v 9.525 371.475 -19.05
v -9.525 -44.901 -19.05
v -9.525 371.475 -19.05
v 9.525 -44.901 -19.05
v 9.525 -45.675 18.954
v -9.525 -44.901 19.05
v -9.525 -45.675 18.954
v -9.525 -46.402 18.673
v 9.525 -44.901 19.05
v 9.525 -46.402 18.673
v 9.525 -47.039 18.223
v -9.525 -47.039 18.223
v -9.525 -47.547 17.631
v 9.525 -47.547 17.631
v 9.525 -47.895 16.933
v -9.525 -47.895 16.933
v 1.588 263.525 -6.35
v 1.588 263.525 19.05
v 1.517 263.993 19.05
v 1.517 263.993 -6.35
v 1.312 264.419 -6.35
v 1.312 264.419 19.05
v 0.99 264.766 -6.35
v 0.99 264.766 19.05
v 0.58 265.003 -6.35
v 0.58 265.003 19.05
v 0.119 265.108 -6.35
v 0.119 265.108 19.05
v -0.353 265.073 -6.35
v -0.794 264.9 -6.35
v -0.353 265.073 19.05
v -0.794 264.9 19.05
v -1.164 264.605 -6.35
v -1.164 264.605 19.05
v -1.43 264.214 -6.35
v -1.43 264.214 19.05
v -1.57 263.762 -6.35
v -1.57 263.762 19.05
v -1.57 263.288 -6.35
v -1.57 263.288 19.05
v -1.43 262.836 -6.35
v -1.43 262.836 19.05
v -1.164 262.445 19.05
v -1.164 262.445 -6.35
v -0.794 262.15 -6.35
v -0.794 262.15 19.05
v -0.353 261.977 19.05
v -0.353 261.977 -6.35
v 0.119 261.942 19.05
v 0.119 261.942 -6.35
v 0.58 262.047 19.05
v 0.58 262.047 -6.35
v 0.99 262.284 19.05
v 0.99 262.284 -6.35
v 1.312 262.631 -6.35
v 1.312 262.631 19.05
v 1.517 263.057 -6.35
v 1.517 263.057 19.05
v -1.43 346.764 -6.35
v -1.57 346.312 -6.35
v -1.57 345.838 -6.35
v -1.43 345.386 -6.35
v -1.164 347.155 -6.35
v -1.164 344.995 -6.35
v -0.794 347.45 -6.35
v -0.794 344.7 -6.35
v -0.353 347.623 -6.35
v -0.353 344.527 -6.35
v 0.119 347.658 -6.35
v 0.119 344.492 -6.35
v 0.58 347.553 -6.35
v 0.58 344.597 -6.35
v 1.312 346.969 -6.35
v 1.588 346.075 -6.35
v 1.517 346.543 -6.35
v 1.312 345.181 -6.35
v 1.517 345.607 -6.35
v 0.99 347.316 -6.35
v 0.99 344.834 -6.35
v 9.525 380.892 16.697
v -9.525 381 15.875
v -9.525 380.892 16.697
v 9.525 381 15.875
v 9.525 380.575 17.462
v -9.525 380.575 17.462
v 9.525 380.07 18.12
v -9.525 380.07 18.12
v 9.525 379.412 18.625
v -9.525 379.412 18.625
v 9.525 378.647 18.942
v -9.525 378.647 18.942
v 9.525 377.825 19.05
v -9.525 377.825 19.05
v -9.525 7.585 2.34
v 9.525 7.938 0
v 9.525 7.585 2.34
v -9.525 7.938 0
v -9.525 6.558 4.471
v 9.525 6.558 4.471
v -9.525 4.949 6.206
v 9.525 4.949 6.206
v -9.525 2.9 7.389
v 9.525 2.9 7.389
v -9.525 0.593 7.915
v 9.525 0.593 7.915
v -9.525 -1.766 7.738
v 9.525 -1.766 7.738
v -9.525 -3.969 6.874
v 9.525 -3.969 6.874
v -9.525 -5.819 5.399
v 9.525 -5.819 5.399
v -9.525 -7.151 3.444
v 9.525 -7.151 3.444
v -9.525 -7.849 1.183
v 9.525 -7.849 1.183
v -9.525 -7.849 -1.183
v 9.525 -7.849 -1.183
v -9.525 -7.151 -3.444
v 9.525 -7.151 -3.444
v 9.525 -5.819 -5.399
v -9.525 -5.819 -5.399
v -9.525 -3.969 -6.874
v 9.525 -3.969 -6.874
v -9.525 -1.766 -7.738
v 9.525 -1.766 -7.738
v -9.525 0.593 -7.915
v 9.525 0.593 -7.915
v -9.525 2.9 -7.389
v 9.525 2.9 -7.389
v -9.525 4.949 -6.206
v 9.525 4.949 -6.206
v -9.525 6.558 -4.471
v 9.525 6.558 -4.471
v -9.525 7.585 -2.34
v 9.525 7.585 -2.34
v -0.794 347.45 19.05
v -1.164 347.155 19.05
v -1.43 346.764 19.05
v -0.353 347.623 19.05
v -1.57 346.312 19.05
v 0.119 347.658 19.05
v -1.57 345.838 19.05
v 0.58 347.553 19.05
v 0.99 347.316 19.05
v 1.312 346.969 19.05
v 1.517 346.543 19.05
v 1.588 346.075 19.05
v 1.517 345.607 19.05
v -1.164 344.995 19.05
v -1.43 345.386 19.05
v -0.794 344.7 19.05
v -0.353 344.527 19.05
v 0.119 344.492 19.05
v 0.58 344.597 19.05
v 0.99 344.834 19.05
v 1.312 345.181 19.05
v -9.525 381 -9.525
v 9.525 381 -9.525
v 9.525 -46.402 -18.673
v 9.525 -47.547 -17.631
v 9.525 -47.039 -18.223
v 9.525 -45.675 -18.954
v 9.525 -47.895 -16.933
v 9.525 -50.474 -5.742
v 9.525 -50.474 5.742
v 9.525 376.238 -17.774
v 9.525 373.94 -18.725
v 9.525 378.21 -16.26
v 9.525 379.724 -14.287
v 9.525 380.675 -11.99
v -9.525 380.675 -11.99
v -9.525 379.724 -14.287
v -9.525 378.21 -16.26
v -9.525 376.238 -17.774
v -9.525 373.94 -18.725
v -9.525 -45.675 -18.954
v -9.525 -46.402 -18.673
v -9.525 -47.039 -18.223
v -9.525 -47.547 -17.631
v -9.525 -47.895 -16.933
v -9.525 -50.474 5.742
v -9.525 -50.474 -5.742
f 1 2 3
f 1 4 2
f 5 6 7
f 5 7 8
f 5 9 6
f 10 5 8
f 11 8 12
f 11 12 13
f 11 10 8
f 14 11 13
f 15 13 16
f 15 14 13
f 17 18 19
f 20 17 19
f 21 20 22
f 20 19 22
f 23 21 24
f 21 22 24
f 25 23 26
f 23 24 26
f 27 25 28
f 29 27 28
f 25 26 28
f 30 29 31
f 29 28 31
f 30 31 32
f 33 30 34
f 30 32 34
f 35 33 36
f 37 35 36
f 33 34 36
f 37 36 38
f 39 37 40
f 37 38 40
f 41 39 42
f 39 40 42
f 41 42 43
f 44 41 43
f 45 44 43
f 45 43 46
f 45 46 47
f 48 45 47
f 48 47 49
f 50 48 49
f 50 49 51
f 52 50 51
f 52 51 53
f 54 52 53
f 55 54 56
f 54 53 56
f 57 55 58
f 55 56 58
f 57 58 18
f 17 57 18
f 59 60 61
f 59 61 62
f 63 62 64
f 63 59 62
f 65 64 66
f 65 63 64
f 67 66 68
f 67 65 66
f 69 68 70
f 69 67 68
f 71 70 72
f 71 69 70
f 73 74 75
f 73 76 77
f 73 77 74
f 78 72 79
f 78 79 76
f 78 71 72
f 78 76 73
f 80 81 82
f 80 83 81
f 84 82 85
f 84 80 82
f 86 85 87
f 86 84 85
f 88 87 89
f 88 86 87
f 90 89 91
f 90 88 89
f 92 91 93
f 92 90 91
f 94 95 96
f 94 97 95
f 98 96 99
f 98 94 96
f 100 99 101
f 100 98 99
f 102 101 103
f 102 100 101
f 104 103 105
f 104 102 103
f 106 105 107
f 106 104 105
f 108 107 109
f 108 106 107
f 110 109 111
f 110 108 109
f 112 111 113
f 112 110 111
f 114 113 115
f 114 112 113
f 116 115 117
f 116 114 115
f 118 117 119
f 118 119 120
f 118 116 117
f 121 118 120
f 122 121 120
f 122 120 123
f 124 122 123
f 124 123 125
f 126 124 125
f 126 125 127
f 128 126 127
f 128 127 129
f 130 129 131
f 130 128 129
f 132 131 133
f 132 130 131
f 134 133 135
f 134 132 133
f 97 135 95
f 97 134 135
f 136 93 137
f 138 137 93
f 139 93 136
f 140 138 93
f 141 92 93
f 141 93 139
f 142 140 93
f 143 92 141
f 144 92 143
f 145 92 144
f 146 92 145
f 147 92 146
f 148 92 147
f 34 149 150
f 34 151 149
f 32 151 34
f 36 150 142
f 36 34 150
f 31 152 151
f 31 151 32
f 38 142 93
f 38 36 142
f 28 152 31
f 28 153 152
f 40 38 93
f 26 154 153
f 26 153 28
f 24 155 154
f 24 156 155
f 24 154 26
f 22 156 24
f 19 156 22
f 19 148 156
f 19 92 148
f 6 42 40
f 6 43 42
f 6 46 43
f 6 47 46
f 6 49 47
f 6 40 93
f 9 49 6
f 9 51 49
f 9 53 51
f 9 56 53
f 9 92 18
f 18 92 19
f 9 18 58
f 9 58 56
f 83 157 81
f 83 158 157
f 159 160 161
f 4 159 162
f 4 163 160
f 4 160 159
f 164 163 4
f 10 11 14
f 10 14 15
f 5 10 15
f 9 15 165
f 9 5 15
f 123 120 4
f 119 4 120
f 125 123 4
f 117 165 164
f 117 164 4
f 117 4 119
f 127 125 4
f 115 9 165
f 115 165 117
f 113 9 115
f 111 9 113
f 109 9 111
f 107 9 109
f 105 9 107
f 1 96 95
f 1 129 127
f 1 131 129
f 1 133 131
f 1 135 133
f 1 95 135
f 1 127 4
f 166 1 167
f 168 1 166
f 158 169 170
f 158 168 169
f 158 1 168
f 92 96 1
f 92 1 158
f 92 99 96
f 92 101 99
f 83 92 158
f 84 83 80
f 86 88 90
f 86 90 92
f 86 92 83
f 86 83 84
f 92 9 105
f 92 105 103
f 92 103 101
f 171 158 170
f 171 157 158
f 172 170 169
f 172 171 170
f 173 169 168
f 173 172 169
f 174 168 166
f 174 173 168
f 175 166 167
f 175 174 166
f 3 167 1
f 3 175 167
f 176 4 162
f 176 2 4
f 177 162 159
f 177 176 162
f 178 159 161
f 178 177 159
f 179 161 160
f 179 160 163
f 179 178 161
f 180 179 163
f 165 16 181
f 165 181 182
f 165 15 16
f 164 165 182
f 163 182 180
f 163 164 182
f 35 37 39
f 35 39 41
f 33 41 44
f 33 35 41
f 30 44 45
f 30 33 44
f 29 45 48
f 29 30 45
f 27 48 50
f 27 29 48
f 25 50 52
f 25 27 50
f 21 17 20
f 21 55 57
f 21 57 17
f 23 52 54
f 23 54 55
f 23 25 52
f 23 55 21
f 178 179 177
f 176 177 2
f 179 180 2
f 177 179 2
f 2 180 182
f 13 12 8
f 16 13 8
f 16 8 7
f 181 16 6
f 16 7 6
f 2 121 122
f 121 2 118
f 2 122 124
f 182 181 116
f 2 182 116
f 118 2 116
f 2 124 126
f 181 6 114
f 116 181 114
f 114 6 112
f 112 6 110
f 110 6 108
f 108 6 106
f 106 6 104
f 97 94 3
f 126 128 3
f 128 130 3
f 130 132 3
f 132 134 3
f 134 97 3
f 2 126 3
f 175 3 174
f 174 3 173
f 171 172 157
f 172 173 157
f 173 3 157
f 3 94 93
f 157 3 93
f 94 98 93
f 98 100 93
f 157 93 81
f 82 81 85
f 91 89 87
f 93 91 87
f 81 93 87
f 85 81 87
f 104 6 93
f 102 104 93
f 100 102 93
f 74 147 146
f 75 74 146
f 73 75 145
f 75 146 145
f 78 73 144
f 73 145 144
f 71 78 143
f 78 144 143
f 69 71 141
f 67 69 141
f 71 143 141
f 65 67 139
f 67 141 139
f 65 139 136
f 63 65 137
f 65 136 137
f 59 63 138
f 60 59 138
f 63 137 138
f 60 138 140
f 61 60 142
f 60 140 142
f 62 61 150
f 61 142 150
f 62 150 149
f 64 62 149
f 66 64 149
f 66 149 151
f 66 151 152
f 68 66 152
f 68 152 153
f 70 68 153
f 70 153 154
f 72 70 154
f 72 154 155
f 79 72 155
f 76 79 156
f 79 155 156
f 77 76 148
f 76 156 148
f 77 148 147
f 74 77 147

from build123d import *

# Parameters (mm, degrees)
F0_R     = 7.9375
F1_DEPTH = 9.525
F2_R     = 1.5875
F3_DEPTH = 25.4
F4_R     = 9.525
F5_R     = 3.175


with BuildPart() as f1:
    # F0 (on Right) → F1 (new body, symmetric)
    with BuildSketch(Plane.YZ):
        with BuildLine():
            Line((381, -19.05), (381, 19.05))
            Line((381, 19.05), (-47.09286, 19.05))
            ThreePointArc((-47.09286, 19.05), (-50.8, 0), (-47.09286, -19.05))
            Line((-47.09286, -19.05), (381, -19.05))
        make_face()
        Circle(F0_R, mode=Mode.SUBTRACT)
    extrude(amount=F1_DEPTH, both=True)

    # F2 (on face) → F3 (cut)
    with BuildSketch(Plane.XY.offset(19.05)):
        with Locations((0, 346.075)):
            Circle(F2_R)
        with Locations((0, 263.525)):
            Circle(F2_R)
    extrude(amount=-F3_DEPTH, mode=Mode.SUBTRACT)

    # F4
    f4_edges = [f1.edges().sort_by_distance(p)[0] for p in [
        (0, 381, -19.05),
    ]]
    fillet(f4_edges, radius=F4_R)

    # F5
    f5_edges = [f1.edges().sort_by_distance(p)[0] for p in [
        (0, 381, 19.05),
        (0, -47.09286, -19.05),
        (0, -47.09286, 19.05),
    ]]
    fillet(f5_edges, radius=F5_R)


solid = f1.part
